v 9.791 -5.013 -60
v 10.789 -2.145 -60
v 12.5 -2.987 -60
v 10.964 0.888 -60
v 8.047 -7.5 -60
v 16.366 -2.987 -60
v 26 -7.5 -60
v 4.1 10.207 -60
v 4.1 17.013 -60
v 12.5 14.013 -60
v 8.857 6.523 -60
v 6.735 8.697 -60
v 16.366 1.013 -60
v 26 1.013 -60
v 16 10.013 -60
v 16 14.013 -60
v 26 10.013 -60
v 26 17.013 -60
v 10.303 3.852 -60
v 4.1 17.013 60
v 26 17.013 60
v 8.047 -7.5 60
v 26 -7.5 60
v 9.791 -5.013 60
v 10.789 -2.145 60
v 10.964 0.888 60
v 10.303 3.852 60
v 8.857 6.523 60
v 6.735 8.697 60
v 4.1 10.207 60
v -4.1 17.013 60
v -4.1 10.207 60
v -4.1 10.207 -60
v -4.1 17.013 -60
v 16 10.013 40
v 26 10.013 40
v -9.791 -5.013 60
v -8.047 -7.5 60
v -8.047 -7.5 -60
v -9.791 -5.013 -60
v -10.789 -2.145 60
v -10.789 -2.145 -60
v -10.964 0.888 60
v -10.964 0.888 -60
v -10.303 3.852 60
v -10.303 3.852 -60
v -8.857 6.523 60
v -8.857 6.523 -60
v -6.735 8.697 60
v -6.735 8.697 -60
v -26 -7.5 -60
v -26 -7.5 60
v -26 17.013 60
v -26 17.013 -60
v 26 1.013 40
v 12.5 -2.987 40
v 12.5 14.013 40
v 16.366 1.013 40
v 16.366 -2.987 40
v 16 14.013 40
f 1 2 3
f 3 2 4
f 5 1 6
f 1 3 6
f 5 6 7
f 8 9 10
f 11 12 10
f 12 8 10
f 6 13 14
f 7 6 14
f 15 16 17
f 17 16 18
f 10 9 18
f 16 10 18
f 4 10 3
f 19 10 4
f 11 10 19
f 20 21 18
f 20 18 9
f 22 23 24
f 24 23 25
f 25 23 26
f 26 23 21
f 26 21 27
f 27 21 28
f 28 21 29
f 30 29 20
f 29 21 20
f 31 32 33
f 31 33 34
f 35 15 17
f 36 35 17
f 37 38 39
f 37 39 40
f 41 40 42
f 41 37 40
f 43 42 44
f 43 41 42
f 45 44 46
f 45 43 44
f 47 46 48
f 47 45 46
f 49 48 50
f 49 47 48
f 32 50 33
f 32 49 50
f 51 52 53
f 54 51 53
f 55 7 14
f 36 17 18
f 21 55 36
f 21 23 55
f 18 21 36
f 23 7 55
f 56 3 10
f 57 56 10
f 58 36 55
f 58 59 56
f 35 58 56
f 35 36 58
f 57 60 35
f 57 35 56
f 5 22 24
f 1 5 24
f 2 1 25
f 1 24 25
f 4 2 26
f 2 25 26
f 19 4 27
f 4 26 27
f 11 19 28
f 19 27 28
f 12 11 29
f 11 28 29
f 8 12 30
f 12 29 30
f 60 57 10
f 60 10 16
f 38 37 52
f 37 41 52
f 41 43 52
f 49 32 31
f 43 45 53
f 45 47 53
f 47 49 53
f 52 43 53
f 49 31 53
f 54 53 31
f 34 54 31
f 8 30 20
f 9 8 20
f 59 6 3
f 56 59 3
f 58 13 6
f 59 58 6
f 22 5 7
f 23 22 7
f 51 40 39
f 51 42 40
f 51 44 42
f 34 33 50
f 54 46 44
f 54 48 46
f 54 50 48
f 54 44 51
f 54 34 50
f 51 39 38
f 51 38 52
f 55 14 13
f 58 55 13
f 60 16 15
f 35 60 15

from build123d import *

# Parameters (mm, degrees)
EXTRUDE_1_DEPTH          = 60
EXTRUDE_2_DEPTH          = 11
EXTRUDE_2_DEPTH_BACK     = 7.5
CUT_EXTRUDE_1_DEPTH      = 77.58616063
CUT_EXTRUDE_1_DEPTH_BACK = 77.58616063
CUT_EXTRUDE_2_DEPTH      = 36
CUT_EXTRUDE_2_DEPTH_BACK = 32
SKETCH_4_W               = 53.786075844
SKETCH_4_H               = 12.400008298
EXTRUDE_3_DEPTH          = 120
CUT_EXTRUDE_3_DEPTH      = 100


with BuildPart() as part:
    # 스케치1 → 보스-돌출1 (new, symmetric)
    with BuildSketch(Plane.XY):
        with BuildLine():
            Line((-26, -7.5), (-15.811388301, -7.5))
            ThreePointArc((-15.811388301, -7.5), (-16.835996569, 4.774852829), (-9.519745153, 14.684156503))
            Line((-9.519745153, 14.684156503), (-26, 4))
            Line((-26, 4), (-26, -7.5))
        make_face()
        with BuildLine():
            ThreePointArc((-9.519745153, 14.684156503), (-16.835996569, 4.774852829), (-15.811388301, -7.5))
            Line((-15.811388301, -7.5), (-8.04673847, -7.5))
            ThreePointArc((-8.04673847, -7.5), (-10.736544018, 2.393036259), (-4.1, 10.207350293))
            Line((-4.1, 10.207350293), (-4.1, 17.012936255))
            ThreePointArc((-4.1, 17.012936255), (-6.90870236, 16.078551916), (-9.519745153, 14.684156503))
        make_face()
    extrude(amount=EXTRUDE_1_DEPTH, both=True)

    # 스케치2 → 보스-돌출2 (add, two sides: drawn at the far end of the back side and taken through both)
    with BuildSketch(Plane(origin=(0, 0, 0), x_dir=(1, 0, 0), z_dir=(0, 1, 0)).offset(-EXTRUDE_2_DEPTH_BACK)):
        Polygon((-26, 60), (-26, 70), (-16, 60), align=None)
    extrude(amount=EXTRUDE_2_DEPTH + EXTRUDE_2_DEPTH_BACK)

    # 스케치3 → 컷-돌출1 (cut, two sides: drawn at the far end of the back side and taken through both)
    with BuildSketch(Plane.XY.offset(-CUT_EXTRUDE_1_DEPTH_BACK)):
        Polygon((-26, 4), (-15.202537057, 11), (-26, 11), align=None)
    extrude(amount=CUT_EXTRUDE_1_DEPTH + CUT_EXTRUDE_1_DEPTH_BACK, mode=Mode.SUBTRACT)


with BuildPart() as body_2:
    # 대칭 복사5: mirrored copy
    add(part.part.mirror(Plane(origin=(0, 0, 0), x_dir=(0, 0, 1), z_dir=(1, 0, 0))))


with BuildPart() as cut_extrude_2_tool:
    # 스케치4 → 컷-돌출2 (new, two sides: drawn at the far end of the back side and taken through both)
    with BuildSketch(Plane(origin=(0, 0, 0), x_dir=(1, 0, 0), z_dir=(0, 1, 0)).offset(-CUT_EXTRUDE_2_DEPTH_BACK)):
        with Locations((0.893037922, 66.200004149)):
            Rectangle(SKETCH_4_W, SKETCH_4_H)
    extrude(amount=CUT_EXTRUDE_2_DEPTH + CUT_EXTRUDE_2_DEPTH_BACK)


with BuildPart() as part_1:
    add(part.part)

    # 컷-돌출2: cut by cut_extrude_2_tool
    add(cut_extrude_2_tool.part, mode=Mode.SUBTRACT)



with BuildPart() as body_2_1:
    add(body_2.part)

    # 컷-돌출2: cut by cut_extrude_2_tool
    add(cut_extrude_2_tool.part, mode=Mode.SUBTRACT)


with BuildPart() as part_2:
    add(part_1.part)

    add(body_2_1.part)  # 보스-돌출3 merges body 2
    # 스케치5 → 보스-돌출3 (add)
    with BuildSketch(Plane.XY.offset(60)):
        Polygon((4.1, 17.012936255), (6.90870236, 16.078551916), (26, 4), (26, 17.012936255), align=None)
        Polygon((-26, 17.012936255), (-4.1, 17.012936255), (-6.90870236, 16.078551916), (-26, 4), align=None)
    extrude(amount=-EXTRUDE_3_DEPTH)

    # 스케치9 → 컷-돌출3 (cut)
    with BuildSketch(Plane(origin=(0, 0, -60), x_dir=(-1, 0, 0), z_dir=(0, 0, -1))):
        Polygon((-16, 10.012936255), (-26, 10.012936255), (-26, 1.012936255), (-16.366468409, 1.012936255), (-16.366468409, -2.987063745), (-12.5, -2.987063745), (-12.5, 14.012936255), (-16, 14.012936255), align=None)
    extrude(amount=-CUT_EXTRUDE_3_DEPTH, mode=Mode.SUBTRACT)


solid = part_2.part
